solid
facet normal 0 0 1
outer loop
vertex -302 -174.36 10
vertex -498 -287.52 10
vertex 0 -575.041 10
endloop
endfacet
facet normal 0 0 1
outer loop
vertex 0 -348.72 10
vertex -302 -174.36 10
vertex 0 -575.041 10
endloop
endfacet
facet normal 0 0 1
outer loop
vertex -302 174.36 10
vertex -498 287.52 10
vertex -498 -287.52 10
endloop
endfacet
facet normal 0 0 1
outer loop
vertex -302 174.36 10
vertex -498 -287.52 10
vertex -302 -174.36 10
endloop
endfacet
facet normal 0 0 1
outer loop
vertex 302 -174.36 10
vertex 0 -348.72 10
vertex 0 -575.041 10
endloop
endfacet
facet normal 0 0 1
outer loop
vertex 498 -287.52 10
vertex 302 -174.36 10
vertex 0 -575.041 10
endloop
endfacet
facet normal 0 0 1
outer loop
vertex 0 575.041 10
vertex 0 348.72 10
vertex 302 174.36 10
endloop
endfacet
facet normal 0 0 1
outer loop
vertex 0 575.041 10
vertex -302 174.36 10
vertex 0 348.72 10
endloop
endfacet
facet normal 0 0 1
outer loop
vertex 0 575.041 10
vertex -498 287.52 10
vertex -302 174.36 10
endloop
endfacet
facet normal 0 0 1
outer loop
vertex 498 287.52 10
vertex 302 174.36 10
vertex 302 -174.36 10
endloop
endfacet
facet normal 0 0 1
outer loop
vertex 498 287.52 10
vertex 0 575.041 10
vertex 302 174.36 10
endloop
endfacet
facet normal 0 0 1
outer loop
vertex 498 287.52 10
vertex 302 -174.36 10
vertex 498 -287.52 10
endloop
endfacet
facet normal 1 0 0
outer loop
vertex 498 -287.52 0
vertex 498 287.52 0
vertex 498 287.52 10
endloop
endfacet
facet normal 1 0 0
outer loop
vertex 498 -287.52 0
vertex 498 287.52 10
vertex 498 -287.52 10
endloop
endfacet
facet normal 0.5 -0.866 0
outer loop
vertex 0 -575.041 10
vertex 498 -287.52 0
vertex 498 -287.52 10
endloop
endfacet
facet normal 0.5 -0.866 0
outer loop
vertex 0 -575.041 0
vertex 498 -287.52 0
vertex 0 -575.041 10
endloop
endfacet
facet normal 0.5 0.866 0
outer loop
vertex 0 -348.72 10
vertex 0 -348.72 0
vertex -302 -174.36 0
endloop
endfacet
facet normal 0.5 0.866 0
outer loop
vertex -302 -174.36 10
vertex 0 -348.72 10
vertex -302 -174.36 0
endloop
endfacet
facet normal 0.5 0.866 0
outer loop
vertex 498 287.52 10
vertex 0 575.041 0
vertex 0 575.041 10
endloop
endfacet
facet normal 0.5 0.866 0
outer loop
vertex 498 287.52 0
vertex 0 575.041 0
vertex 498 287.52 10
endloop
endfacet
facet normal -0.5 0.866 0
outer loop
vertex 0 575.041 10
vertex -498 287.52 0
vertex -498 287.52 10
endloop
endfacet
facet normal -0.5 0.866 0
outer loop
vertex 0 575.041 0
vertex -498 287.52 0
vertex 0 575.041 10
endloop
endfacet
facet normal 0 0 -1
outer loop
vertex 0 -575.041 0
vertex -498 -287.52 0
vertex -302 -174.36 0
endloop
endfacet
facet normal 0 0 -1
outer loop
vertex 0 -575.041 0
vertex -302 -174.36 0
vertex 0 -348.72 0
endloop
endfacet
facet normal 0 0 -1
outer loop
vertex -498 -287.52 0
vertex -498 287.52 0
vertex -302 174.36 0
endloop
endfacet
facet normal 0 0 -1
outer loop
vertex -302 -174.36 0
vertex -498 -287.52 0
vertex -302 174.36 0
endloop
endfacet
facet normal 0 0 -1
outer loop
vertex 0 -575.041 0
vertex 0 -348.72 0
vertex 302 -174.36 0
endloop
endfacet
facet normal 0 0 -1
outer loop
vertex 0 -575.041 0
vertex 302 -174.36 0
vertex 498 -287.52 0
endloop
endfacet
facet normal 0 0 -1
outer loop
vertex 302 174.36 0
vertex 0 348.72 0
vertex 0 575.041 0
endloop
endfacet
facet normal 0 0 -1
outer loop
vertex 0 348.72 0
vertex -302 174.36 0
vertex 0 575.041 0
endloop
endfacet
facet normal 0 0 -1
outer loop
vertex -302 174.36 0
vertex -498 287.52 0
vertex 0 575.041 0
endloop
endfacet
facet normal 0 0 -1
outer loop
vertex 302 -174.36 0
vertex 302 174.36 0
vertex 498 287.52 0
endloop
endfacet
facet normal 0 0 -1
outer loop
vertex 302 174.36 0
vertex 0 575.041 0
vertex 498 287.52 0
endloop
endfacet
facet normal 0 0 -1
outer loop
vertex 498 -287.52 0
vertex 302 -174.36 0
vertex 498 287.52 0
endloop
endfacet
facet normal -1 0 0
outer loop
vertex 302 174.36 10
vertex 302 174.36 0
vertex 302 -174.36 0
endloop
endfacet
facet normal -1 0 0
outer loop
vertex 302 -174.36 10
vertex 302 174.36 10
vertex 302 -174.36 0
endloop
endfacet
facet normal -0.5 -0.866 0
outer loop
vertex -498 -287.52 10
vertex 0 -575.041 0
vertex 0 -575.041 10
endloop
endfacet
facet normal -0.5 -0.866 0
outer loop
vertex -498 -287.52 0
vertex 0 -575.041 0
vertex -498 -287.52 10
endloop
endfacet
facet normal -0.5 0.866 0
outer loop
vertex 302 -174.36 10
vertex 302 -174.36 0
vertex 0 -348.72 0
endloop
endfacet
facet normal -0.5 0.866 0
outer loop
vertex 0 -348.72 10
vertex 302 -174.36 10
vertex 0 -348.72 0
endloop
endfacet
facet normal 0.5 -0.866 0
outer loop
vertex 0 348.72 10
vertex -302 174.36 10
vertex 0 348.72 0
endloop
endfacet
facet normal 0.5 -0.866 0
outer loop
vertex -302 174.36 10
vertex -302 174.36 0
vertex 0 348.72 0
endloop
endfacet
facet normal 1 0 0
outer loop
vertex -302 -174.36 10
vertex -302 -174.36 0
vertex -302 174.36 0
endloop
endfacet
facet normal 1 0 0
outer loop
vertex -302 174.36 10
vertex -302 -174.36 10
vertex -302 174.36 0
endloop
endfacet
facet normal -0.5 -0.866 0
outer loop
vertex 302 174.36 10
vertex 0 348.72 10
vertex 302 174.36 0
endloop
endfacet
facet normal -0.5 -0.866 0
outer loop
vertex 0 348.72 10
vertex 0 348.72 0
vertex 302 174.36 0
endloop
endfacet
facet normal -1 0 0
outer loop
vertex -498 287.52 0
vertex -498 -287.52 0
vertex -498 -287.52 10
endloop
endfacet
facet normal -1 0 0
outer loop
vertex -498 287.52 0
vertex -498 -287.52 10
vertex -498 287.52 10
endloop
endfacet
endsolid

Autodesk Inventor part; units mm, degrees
ref_plane "YZ Plane" through (0, 0, 0) normal (1, 0, 0) x (0, 1, 0)
ref_plane "XZ Plane" through (0, 0, 0) normal (0, 1, 0) x (-1, 0, 0)
ref_plane "Work Plane1" through (0, 0, 0) normal (0, 0, 1) x (1, 0, 0)
sketch "Sketch1" plane through (0, 0, 0) normal (0, 0, 1) x (1, 0, 0)
  line L0 (302, -174.3598) -> (0, -348.7196)
  line L1 (0, -348.7196) -> (-302, -174.3598)
  line L2 (-302, -174.3598) -> (-302, 174.3598)
  line L3 (-302, 174.3598) -> (0, 348.7196)
  line L4 (0, 348.7196) -> (302, 174.3598)
  line L5 (302, 174.3598) -> (302, -174.3598)
  line L6 (498, -287.5204) -> (0, -575.0409)
  line L7 (0, -575.0409) -> (-498, -287.5204)
  line L8 (-498, -287.5204) -> (-498, 287.5204)
  line L9 (-498, 287.5204) -> (0, 575.0409)
  line L10 (0, 575.0409) -> (498, 287.5204)
  line L11 (498, 287.5204) -> (498, -287.5204)
  point P0 (0, 0)
  point P1 (0, 0)
  point P2 (0, 0)
  dimension "d0" = 302
  dimension "d1" = 498
extrude "Extrusion1" add sketch "Sketch1" along normal blind 10
properties part number "Membrane" material "Nylon 6/6"
